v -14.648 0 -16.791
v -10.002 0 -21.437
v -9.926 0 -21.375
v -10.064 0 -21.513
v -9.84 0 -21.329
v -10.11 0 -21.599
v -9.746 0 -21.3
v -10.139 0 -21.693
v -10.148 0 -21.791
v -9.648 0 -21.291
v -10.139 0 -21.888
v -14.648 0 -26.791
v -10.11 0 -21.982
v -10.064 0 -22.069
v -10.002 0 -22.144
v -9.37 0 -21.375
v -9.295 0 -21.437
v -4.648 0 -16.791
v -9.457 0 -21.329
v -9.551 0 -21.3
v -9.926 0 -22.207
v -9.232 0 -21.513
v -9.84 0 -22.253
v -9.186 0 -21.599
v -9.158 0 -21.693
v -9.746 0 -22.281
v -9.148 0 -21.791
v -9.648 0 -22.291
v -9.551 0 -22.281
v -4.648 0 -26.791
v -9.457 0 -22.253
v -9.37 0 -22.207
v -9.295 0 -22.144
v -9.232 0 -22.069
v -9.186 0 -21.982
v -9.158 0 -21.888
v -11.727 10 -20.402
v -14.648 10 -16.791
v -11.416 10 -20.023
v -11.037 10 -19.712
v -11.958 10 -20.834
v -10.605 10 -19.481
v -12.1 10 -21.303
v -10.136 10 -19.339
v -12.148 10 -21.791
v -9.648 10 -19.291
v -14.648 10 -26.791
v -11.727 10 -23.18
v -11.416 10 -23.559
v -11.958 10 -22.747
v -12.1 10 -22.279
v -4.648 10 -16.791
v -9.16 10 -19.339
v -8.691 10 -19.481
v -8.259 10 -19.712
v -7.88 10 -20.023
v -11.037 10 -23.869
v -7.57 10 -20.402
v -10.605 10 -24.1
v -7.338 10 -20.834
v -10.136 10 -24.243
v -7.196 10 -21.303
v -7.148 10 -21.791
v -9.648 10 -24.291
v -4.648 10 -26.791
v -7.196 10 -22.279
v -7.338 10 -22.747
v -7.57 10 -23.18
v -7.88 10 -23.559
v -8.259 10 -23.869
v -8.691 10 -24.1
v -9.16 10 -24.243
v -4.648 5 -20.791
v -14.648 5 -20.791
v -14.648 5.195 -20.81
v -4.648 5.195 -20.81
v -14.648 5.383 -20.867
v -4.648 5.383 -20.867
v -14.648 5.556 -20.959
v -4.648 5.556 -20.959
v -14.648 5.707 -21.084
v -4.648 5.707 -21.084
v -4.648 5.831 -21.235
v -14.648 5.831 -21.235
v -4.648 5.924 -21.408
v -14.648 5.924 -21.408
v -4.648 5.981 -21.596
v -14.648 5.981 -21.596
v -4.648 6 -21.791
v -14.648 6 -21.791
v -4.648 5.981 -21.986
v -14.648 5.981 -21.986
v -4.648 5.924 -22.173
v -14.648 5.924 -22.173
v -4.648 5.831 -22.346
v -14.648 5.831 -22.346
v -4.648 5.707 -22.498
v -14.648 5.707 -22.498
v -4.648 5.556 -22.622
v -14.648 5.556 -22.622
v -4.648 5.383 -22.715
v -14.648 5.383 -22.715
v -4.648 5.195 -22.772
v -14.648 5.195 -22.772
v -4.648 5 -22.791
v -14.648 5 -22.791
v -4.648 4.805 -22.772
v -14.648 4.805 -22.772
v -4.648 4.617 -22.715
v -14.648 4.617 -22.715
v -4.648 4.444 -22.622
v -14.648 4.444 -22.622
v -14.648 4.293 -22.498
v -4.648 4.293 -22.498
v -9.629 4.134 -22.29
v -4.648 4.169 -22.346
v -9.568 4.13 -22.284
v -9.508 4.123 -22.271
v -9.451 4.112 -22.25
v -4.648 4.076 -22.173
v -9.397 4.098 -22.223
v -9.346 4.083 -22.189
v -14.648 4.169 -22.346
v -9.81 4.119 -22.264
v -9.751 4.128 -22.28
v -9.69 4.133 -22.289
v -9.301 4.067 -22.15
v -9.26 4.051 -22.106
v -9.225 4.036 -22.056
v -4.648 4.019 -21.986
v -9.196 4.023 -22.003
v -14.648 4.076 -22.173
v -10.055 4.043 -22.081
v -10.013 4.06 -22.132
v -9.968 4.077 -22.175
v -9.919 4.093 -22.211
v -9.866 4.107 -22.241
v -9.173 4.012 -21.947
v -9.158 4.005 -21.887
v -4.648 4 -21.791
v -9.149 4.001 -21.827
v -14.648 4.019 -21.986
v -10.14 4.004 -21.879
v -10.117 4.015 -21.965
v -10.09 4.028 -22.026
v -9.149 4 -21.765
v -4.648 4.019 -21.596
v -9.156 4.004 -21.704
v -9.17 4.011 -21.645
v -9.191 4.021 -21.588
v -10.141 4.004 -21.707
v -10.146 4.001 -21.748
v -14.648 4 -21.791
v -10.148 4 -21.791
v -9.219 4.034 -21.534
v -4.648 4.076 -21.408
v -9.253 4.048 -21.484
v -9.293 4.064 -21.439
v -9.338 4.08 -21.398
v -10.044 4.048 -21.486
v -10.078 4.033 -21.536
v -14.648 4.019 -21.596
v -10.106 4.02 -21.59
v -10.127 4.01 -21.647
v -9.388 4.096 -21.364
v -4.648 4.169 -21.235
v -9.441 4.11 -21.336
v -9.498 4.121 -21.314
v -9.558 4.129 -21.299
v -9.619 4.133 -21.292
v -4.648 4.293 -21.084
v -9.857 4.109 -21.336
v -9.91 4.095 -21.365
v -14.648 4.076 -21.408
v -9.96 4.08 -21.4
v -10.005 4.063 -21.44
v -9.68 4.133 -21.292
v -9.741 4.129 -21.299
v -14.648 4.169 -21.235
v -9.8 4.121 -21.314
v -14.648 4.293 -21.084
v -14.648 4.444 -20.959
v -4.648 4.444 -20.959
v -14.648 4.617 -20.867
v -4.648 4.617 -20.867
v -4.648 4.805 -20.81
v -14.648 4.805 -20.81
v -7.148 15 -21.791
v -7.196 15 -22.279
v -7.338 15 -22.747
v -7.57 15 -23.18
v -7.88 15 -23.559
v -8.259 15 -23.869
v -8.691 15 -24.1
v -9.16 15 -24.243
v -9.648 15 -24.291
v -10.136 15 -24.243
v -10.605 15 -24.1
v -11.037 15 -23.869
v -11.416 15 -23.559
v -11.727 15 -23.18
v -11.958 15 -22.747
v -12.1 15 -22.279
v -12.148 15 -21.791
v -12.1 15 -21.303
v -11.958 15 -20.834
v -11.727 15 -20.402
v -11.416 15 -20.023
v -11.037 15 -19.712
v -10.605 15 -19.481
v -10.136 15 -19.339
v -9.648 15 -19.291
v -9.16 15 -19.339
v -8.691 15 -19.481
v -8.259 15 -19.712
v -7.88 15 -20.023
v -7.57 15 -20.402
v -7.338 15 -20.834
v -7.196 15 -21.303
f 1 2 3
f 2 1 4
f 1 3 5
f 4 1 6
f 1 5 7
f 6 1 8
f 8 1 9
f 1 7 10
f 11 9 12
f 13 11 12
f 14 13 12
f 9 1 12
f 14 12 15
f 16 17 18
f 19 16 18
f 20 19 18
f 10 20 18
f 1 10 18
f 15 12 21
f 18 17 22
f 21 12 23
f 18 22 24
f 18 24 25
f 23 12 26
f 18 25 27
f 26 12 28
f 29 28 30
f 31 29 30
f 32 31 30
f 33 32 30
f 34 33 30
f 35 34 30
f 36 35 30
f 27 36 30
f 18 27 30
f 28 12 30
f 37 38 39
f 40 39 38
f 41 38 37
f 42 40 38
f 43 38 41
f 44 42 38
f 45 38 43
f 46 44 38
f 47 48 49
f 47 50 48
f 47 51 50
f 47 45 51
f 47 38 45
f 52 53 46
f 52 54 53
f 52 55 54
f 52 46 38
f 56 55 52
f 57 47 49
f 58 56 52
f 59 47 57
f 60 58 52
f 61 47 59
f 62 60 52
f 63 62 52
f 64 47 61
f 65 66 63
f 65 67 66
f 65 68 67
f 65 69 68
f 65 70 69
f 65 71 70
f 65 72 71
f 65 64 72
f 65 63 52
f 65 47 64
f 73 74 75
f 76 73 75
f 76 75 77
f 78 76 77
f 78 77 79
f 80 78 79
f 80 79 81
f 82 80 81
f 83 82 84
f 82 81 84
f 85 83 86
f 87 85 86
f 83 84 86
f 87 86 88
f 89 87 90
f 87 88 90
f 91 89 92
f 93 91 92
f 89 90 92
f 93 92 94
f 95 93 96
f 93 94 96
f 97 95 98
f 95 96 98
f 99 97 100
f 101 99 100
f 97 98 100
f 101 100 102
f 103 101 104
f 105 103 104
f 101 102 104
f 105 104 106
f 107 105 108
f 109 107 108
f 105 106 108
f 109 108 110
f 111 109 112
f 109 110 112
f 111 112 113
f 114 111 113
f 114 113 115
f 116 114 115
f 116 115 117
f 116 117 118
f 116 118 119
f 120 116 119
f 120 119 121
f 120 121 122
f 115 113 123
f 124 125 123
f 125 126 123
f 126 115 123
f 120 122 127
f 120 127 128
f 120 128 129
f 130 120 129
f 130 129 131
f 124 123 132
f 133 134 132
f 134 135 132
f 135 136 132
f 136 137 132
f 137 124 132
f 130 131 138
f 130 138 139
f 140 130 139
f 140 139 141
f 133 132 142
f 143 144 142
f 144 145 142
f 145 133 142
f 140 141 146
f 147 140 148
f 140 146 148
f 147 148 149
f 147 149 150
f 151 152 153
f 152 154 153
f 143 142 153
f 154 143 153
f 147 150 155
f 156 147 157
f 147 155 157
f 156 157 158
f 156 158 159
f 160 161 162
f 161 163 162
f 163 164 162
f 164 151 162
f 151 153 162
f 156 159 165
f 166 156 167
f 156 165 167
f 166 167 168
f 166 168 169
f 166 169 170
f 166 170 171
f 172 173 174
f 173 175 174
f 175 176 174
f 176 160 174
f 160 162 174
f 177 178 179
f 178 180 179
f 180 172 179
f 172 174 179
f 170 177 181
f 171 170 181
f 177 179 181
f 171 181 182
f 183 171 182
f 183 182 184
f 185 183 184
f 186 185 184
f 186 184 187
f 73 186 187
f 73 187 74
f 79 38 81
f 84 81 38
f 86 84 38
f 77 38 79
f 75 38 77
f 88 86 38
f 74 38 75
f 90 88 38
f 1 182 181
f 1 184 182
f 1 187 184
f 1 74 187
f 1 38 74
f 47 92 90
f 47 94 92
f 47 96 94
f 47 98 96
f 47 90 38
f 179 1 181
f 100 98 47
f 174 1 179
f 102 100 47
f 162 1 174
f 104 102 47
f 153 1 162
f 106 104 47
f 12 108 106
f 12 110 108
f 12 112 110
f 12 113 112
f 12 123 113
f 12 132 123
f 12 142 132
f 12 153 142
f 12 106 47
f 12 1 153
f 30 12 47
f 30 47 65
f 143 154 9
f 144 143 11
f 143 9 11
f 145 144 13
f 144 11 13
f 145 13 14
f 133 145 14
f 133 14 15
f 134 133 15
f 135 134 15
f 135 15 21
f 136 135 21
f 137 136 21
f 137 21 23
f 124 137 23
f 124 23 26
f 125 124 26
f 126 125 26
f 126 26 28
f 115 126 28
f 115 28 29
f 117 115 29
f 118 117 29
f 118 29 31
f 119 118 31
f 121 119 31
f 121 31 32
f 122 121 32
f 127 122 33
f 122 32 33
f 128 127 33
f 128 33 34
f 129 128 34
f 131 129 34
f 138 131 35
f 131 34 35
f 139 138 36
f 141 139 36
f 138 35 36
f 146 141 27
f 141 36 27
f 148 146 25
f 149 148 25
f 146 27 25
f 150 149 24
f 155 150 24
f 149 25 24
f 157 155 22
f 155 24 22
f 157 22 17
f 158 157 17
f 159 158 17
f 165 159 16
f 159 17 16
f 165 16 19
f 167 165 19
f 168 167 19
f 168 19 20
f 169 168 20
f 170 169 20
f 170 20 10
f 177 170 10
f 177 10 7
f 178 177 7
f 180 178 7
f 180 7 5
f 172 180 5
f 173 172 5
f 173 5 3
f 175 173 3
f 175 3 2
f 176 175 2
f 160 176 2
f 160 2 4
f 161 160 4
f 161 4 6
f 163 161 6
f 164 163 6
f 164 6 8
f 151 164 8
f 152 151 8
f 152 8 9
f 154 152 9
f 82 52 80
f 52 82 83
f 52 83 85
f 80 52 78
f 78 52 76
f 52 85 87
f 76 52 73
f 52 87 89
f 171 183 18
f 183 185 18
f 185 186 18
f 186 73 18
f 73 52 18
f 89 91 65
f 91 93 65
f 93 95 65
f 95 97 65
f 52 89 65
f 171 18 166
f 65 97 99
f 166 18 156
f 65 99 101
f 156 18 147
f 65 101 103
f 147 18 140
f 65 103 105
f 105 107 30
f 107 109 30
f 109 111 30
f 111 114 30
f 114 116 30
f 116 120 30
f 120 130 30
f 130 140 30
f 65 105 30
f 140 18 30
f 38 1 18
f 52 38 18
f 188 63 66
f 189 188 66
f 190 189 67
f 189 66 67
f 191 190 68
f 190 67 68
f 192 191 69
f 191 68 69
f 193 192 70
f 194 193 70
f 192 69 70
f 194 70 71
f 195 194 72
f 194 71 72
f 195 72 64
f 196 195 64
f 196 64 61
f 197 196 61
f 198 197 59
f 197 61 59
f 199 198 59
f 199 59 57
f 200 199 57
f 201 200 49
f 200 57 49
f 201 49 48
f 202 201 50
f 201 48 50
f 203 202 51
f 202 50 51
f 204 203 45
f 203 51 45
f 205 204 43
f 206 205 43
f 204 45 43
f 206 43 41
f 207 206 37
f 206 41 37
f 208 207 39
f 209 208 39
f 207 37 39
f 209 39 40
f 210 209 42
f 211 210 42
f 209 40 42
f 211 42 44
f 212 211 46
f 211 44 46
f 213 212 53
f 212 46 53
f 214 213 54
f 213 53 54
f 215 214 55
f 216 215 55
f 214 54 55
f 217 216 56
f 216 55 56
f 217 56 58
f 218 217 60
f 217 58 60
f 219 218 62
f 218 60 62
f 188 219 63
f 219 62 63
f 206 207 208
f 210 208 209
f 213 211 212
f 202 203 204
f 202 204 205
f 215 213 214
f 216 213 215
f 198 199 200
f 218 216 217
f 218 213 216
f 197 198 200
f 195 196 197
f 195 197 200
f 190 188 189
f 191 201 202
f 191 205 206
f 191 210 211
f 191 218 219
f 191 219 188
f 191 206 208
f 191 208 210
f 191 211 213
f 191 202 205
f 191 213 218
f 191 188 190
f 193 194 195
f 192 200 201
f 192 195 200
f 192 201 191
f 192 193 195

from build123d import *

# Parameters (mm, degrees)
SKETCH1_W           = 10
SKETCH1_H           = 10
BOSS_EXTRUDE1_DEPTH = 10
SKETCH2_R           = 2.5
BOSS_EXTRUDE2_DEPTH = 5
SKETCH3_R           = 1
CUT_EXTRUDE1_DEPTH  = 10
SKETCH4_R           = 0.5
CUT_EXTRUDE2_DEPTH  = 5


with BuildPart() as part:
    # Sketch1 → Boss-Extrude1 (new body)
    with BuildSketch(Plane(origin=(0, 0, 0), x_dir=(1, 0, 0), z_dir=(0, 1, 0))):
        with Locations((-9.64819331, 21.790774606)):
            Rectangle(SKETCH1_W, SKETCH1_H)
    extrude(amount=BOSS_EXTRUDE1_DEPTH)

    # Sketch2 → Boss-Extrude2 (add)
    with BuildSketch(Plane(origin=(0, 10, 0), x_dir=(1, 0, 0), z_dir=(0, 1, 0))):
        with Locations((-9.64819331, 21.790774606)):
            Circle(SKETCH2_R)
    extrude(amount=BOSS_EXTRUDE2_DEPTH)

    # Sketch3 → Cut-Extrude1 (cut)
    with BuildSketch(Plane.ZY.offset(14.64819331)):
        with Locations((-21.790774606, 5)):
            Circle(SKETCH3_R)
    extrude(amount=-CUT_EXTRUDE1_DEPTH, mode=Mode.SUBTRACT)

    # Sketch4 → Cut-Extrude2 (cut)
    with BuildSketch(Plane(origin=(0, 0, 0), x_dir=(-1, 0, 0), z_dir=(0, -1, 0))):
        with Locations((9.64819331, 21.790774606)):
            Circle(SKETCH4_R)
    extrude(amount=-CUT_EXTRUDE2_DEPTH, mode=Mode.SUBTRACT)


solid = part.part
